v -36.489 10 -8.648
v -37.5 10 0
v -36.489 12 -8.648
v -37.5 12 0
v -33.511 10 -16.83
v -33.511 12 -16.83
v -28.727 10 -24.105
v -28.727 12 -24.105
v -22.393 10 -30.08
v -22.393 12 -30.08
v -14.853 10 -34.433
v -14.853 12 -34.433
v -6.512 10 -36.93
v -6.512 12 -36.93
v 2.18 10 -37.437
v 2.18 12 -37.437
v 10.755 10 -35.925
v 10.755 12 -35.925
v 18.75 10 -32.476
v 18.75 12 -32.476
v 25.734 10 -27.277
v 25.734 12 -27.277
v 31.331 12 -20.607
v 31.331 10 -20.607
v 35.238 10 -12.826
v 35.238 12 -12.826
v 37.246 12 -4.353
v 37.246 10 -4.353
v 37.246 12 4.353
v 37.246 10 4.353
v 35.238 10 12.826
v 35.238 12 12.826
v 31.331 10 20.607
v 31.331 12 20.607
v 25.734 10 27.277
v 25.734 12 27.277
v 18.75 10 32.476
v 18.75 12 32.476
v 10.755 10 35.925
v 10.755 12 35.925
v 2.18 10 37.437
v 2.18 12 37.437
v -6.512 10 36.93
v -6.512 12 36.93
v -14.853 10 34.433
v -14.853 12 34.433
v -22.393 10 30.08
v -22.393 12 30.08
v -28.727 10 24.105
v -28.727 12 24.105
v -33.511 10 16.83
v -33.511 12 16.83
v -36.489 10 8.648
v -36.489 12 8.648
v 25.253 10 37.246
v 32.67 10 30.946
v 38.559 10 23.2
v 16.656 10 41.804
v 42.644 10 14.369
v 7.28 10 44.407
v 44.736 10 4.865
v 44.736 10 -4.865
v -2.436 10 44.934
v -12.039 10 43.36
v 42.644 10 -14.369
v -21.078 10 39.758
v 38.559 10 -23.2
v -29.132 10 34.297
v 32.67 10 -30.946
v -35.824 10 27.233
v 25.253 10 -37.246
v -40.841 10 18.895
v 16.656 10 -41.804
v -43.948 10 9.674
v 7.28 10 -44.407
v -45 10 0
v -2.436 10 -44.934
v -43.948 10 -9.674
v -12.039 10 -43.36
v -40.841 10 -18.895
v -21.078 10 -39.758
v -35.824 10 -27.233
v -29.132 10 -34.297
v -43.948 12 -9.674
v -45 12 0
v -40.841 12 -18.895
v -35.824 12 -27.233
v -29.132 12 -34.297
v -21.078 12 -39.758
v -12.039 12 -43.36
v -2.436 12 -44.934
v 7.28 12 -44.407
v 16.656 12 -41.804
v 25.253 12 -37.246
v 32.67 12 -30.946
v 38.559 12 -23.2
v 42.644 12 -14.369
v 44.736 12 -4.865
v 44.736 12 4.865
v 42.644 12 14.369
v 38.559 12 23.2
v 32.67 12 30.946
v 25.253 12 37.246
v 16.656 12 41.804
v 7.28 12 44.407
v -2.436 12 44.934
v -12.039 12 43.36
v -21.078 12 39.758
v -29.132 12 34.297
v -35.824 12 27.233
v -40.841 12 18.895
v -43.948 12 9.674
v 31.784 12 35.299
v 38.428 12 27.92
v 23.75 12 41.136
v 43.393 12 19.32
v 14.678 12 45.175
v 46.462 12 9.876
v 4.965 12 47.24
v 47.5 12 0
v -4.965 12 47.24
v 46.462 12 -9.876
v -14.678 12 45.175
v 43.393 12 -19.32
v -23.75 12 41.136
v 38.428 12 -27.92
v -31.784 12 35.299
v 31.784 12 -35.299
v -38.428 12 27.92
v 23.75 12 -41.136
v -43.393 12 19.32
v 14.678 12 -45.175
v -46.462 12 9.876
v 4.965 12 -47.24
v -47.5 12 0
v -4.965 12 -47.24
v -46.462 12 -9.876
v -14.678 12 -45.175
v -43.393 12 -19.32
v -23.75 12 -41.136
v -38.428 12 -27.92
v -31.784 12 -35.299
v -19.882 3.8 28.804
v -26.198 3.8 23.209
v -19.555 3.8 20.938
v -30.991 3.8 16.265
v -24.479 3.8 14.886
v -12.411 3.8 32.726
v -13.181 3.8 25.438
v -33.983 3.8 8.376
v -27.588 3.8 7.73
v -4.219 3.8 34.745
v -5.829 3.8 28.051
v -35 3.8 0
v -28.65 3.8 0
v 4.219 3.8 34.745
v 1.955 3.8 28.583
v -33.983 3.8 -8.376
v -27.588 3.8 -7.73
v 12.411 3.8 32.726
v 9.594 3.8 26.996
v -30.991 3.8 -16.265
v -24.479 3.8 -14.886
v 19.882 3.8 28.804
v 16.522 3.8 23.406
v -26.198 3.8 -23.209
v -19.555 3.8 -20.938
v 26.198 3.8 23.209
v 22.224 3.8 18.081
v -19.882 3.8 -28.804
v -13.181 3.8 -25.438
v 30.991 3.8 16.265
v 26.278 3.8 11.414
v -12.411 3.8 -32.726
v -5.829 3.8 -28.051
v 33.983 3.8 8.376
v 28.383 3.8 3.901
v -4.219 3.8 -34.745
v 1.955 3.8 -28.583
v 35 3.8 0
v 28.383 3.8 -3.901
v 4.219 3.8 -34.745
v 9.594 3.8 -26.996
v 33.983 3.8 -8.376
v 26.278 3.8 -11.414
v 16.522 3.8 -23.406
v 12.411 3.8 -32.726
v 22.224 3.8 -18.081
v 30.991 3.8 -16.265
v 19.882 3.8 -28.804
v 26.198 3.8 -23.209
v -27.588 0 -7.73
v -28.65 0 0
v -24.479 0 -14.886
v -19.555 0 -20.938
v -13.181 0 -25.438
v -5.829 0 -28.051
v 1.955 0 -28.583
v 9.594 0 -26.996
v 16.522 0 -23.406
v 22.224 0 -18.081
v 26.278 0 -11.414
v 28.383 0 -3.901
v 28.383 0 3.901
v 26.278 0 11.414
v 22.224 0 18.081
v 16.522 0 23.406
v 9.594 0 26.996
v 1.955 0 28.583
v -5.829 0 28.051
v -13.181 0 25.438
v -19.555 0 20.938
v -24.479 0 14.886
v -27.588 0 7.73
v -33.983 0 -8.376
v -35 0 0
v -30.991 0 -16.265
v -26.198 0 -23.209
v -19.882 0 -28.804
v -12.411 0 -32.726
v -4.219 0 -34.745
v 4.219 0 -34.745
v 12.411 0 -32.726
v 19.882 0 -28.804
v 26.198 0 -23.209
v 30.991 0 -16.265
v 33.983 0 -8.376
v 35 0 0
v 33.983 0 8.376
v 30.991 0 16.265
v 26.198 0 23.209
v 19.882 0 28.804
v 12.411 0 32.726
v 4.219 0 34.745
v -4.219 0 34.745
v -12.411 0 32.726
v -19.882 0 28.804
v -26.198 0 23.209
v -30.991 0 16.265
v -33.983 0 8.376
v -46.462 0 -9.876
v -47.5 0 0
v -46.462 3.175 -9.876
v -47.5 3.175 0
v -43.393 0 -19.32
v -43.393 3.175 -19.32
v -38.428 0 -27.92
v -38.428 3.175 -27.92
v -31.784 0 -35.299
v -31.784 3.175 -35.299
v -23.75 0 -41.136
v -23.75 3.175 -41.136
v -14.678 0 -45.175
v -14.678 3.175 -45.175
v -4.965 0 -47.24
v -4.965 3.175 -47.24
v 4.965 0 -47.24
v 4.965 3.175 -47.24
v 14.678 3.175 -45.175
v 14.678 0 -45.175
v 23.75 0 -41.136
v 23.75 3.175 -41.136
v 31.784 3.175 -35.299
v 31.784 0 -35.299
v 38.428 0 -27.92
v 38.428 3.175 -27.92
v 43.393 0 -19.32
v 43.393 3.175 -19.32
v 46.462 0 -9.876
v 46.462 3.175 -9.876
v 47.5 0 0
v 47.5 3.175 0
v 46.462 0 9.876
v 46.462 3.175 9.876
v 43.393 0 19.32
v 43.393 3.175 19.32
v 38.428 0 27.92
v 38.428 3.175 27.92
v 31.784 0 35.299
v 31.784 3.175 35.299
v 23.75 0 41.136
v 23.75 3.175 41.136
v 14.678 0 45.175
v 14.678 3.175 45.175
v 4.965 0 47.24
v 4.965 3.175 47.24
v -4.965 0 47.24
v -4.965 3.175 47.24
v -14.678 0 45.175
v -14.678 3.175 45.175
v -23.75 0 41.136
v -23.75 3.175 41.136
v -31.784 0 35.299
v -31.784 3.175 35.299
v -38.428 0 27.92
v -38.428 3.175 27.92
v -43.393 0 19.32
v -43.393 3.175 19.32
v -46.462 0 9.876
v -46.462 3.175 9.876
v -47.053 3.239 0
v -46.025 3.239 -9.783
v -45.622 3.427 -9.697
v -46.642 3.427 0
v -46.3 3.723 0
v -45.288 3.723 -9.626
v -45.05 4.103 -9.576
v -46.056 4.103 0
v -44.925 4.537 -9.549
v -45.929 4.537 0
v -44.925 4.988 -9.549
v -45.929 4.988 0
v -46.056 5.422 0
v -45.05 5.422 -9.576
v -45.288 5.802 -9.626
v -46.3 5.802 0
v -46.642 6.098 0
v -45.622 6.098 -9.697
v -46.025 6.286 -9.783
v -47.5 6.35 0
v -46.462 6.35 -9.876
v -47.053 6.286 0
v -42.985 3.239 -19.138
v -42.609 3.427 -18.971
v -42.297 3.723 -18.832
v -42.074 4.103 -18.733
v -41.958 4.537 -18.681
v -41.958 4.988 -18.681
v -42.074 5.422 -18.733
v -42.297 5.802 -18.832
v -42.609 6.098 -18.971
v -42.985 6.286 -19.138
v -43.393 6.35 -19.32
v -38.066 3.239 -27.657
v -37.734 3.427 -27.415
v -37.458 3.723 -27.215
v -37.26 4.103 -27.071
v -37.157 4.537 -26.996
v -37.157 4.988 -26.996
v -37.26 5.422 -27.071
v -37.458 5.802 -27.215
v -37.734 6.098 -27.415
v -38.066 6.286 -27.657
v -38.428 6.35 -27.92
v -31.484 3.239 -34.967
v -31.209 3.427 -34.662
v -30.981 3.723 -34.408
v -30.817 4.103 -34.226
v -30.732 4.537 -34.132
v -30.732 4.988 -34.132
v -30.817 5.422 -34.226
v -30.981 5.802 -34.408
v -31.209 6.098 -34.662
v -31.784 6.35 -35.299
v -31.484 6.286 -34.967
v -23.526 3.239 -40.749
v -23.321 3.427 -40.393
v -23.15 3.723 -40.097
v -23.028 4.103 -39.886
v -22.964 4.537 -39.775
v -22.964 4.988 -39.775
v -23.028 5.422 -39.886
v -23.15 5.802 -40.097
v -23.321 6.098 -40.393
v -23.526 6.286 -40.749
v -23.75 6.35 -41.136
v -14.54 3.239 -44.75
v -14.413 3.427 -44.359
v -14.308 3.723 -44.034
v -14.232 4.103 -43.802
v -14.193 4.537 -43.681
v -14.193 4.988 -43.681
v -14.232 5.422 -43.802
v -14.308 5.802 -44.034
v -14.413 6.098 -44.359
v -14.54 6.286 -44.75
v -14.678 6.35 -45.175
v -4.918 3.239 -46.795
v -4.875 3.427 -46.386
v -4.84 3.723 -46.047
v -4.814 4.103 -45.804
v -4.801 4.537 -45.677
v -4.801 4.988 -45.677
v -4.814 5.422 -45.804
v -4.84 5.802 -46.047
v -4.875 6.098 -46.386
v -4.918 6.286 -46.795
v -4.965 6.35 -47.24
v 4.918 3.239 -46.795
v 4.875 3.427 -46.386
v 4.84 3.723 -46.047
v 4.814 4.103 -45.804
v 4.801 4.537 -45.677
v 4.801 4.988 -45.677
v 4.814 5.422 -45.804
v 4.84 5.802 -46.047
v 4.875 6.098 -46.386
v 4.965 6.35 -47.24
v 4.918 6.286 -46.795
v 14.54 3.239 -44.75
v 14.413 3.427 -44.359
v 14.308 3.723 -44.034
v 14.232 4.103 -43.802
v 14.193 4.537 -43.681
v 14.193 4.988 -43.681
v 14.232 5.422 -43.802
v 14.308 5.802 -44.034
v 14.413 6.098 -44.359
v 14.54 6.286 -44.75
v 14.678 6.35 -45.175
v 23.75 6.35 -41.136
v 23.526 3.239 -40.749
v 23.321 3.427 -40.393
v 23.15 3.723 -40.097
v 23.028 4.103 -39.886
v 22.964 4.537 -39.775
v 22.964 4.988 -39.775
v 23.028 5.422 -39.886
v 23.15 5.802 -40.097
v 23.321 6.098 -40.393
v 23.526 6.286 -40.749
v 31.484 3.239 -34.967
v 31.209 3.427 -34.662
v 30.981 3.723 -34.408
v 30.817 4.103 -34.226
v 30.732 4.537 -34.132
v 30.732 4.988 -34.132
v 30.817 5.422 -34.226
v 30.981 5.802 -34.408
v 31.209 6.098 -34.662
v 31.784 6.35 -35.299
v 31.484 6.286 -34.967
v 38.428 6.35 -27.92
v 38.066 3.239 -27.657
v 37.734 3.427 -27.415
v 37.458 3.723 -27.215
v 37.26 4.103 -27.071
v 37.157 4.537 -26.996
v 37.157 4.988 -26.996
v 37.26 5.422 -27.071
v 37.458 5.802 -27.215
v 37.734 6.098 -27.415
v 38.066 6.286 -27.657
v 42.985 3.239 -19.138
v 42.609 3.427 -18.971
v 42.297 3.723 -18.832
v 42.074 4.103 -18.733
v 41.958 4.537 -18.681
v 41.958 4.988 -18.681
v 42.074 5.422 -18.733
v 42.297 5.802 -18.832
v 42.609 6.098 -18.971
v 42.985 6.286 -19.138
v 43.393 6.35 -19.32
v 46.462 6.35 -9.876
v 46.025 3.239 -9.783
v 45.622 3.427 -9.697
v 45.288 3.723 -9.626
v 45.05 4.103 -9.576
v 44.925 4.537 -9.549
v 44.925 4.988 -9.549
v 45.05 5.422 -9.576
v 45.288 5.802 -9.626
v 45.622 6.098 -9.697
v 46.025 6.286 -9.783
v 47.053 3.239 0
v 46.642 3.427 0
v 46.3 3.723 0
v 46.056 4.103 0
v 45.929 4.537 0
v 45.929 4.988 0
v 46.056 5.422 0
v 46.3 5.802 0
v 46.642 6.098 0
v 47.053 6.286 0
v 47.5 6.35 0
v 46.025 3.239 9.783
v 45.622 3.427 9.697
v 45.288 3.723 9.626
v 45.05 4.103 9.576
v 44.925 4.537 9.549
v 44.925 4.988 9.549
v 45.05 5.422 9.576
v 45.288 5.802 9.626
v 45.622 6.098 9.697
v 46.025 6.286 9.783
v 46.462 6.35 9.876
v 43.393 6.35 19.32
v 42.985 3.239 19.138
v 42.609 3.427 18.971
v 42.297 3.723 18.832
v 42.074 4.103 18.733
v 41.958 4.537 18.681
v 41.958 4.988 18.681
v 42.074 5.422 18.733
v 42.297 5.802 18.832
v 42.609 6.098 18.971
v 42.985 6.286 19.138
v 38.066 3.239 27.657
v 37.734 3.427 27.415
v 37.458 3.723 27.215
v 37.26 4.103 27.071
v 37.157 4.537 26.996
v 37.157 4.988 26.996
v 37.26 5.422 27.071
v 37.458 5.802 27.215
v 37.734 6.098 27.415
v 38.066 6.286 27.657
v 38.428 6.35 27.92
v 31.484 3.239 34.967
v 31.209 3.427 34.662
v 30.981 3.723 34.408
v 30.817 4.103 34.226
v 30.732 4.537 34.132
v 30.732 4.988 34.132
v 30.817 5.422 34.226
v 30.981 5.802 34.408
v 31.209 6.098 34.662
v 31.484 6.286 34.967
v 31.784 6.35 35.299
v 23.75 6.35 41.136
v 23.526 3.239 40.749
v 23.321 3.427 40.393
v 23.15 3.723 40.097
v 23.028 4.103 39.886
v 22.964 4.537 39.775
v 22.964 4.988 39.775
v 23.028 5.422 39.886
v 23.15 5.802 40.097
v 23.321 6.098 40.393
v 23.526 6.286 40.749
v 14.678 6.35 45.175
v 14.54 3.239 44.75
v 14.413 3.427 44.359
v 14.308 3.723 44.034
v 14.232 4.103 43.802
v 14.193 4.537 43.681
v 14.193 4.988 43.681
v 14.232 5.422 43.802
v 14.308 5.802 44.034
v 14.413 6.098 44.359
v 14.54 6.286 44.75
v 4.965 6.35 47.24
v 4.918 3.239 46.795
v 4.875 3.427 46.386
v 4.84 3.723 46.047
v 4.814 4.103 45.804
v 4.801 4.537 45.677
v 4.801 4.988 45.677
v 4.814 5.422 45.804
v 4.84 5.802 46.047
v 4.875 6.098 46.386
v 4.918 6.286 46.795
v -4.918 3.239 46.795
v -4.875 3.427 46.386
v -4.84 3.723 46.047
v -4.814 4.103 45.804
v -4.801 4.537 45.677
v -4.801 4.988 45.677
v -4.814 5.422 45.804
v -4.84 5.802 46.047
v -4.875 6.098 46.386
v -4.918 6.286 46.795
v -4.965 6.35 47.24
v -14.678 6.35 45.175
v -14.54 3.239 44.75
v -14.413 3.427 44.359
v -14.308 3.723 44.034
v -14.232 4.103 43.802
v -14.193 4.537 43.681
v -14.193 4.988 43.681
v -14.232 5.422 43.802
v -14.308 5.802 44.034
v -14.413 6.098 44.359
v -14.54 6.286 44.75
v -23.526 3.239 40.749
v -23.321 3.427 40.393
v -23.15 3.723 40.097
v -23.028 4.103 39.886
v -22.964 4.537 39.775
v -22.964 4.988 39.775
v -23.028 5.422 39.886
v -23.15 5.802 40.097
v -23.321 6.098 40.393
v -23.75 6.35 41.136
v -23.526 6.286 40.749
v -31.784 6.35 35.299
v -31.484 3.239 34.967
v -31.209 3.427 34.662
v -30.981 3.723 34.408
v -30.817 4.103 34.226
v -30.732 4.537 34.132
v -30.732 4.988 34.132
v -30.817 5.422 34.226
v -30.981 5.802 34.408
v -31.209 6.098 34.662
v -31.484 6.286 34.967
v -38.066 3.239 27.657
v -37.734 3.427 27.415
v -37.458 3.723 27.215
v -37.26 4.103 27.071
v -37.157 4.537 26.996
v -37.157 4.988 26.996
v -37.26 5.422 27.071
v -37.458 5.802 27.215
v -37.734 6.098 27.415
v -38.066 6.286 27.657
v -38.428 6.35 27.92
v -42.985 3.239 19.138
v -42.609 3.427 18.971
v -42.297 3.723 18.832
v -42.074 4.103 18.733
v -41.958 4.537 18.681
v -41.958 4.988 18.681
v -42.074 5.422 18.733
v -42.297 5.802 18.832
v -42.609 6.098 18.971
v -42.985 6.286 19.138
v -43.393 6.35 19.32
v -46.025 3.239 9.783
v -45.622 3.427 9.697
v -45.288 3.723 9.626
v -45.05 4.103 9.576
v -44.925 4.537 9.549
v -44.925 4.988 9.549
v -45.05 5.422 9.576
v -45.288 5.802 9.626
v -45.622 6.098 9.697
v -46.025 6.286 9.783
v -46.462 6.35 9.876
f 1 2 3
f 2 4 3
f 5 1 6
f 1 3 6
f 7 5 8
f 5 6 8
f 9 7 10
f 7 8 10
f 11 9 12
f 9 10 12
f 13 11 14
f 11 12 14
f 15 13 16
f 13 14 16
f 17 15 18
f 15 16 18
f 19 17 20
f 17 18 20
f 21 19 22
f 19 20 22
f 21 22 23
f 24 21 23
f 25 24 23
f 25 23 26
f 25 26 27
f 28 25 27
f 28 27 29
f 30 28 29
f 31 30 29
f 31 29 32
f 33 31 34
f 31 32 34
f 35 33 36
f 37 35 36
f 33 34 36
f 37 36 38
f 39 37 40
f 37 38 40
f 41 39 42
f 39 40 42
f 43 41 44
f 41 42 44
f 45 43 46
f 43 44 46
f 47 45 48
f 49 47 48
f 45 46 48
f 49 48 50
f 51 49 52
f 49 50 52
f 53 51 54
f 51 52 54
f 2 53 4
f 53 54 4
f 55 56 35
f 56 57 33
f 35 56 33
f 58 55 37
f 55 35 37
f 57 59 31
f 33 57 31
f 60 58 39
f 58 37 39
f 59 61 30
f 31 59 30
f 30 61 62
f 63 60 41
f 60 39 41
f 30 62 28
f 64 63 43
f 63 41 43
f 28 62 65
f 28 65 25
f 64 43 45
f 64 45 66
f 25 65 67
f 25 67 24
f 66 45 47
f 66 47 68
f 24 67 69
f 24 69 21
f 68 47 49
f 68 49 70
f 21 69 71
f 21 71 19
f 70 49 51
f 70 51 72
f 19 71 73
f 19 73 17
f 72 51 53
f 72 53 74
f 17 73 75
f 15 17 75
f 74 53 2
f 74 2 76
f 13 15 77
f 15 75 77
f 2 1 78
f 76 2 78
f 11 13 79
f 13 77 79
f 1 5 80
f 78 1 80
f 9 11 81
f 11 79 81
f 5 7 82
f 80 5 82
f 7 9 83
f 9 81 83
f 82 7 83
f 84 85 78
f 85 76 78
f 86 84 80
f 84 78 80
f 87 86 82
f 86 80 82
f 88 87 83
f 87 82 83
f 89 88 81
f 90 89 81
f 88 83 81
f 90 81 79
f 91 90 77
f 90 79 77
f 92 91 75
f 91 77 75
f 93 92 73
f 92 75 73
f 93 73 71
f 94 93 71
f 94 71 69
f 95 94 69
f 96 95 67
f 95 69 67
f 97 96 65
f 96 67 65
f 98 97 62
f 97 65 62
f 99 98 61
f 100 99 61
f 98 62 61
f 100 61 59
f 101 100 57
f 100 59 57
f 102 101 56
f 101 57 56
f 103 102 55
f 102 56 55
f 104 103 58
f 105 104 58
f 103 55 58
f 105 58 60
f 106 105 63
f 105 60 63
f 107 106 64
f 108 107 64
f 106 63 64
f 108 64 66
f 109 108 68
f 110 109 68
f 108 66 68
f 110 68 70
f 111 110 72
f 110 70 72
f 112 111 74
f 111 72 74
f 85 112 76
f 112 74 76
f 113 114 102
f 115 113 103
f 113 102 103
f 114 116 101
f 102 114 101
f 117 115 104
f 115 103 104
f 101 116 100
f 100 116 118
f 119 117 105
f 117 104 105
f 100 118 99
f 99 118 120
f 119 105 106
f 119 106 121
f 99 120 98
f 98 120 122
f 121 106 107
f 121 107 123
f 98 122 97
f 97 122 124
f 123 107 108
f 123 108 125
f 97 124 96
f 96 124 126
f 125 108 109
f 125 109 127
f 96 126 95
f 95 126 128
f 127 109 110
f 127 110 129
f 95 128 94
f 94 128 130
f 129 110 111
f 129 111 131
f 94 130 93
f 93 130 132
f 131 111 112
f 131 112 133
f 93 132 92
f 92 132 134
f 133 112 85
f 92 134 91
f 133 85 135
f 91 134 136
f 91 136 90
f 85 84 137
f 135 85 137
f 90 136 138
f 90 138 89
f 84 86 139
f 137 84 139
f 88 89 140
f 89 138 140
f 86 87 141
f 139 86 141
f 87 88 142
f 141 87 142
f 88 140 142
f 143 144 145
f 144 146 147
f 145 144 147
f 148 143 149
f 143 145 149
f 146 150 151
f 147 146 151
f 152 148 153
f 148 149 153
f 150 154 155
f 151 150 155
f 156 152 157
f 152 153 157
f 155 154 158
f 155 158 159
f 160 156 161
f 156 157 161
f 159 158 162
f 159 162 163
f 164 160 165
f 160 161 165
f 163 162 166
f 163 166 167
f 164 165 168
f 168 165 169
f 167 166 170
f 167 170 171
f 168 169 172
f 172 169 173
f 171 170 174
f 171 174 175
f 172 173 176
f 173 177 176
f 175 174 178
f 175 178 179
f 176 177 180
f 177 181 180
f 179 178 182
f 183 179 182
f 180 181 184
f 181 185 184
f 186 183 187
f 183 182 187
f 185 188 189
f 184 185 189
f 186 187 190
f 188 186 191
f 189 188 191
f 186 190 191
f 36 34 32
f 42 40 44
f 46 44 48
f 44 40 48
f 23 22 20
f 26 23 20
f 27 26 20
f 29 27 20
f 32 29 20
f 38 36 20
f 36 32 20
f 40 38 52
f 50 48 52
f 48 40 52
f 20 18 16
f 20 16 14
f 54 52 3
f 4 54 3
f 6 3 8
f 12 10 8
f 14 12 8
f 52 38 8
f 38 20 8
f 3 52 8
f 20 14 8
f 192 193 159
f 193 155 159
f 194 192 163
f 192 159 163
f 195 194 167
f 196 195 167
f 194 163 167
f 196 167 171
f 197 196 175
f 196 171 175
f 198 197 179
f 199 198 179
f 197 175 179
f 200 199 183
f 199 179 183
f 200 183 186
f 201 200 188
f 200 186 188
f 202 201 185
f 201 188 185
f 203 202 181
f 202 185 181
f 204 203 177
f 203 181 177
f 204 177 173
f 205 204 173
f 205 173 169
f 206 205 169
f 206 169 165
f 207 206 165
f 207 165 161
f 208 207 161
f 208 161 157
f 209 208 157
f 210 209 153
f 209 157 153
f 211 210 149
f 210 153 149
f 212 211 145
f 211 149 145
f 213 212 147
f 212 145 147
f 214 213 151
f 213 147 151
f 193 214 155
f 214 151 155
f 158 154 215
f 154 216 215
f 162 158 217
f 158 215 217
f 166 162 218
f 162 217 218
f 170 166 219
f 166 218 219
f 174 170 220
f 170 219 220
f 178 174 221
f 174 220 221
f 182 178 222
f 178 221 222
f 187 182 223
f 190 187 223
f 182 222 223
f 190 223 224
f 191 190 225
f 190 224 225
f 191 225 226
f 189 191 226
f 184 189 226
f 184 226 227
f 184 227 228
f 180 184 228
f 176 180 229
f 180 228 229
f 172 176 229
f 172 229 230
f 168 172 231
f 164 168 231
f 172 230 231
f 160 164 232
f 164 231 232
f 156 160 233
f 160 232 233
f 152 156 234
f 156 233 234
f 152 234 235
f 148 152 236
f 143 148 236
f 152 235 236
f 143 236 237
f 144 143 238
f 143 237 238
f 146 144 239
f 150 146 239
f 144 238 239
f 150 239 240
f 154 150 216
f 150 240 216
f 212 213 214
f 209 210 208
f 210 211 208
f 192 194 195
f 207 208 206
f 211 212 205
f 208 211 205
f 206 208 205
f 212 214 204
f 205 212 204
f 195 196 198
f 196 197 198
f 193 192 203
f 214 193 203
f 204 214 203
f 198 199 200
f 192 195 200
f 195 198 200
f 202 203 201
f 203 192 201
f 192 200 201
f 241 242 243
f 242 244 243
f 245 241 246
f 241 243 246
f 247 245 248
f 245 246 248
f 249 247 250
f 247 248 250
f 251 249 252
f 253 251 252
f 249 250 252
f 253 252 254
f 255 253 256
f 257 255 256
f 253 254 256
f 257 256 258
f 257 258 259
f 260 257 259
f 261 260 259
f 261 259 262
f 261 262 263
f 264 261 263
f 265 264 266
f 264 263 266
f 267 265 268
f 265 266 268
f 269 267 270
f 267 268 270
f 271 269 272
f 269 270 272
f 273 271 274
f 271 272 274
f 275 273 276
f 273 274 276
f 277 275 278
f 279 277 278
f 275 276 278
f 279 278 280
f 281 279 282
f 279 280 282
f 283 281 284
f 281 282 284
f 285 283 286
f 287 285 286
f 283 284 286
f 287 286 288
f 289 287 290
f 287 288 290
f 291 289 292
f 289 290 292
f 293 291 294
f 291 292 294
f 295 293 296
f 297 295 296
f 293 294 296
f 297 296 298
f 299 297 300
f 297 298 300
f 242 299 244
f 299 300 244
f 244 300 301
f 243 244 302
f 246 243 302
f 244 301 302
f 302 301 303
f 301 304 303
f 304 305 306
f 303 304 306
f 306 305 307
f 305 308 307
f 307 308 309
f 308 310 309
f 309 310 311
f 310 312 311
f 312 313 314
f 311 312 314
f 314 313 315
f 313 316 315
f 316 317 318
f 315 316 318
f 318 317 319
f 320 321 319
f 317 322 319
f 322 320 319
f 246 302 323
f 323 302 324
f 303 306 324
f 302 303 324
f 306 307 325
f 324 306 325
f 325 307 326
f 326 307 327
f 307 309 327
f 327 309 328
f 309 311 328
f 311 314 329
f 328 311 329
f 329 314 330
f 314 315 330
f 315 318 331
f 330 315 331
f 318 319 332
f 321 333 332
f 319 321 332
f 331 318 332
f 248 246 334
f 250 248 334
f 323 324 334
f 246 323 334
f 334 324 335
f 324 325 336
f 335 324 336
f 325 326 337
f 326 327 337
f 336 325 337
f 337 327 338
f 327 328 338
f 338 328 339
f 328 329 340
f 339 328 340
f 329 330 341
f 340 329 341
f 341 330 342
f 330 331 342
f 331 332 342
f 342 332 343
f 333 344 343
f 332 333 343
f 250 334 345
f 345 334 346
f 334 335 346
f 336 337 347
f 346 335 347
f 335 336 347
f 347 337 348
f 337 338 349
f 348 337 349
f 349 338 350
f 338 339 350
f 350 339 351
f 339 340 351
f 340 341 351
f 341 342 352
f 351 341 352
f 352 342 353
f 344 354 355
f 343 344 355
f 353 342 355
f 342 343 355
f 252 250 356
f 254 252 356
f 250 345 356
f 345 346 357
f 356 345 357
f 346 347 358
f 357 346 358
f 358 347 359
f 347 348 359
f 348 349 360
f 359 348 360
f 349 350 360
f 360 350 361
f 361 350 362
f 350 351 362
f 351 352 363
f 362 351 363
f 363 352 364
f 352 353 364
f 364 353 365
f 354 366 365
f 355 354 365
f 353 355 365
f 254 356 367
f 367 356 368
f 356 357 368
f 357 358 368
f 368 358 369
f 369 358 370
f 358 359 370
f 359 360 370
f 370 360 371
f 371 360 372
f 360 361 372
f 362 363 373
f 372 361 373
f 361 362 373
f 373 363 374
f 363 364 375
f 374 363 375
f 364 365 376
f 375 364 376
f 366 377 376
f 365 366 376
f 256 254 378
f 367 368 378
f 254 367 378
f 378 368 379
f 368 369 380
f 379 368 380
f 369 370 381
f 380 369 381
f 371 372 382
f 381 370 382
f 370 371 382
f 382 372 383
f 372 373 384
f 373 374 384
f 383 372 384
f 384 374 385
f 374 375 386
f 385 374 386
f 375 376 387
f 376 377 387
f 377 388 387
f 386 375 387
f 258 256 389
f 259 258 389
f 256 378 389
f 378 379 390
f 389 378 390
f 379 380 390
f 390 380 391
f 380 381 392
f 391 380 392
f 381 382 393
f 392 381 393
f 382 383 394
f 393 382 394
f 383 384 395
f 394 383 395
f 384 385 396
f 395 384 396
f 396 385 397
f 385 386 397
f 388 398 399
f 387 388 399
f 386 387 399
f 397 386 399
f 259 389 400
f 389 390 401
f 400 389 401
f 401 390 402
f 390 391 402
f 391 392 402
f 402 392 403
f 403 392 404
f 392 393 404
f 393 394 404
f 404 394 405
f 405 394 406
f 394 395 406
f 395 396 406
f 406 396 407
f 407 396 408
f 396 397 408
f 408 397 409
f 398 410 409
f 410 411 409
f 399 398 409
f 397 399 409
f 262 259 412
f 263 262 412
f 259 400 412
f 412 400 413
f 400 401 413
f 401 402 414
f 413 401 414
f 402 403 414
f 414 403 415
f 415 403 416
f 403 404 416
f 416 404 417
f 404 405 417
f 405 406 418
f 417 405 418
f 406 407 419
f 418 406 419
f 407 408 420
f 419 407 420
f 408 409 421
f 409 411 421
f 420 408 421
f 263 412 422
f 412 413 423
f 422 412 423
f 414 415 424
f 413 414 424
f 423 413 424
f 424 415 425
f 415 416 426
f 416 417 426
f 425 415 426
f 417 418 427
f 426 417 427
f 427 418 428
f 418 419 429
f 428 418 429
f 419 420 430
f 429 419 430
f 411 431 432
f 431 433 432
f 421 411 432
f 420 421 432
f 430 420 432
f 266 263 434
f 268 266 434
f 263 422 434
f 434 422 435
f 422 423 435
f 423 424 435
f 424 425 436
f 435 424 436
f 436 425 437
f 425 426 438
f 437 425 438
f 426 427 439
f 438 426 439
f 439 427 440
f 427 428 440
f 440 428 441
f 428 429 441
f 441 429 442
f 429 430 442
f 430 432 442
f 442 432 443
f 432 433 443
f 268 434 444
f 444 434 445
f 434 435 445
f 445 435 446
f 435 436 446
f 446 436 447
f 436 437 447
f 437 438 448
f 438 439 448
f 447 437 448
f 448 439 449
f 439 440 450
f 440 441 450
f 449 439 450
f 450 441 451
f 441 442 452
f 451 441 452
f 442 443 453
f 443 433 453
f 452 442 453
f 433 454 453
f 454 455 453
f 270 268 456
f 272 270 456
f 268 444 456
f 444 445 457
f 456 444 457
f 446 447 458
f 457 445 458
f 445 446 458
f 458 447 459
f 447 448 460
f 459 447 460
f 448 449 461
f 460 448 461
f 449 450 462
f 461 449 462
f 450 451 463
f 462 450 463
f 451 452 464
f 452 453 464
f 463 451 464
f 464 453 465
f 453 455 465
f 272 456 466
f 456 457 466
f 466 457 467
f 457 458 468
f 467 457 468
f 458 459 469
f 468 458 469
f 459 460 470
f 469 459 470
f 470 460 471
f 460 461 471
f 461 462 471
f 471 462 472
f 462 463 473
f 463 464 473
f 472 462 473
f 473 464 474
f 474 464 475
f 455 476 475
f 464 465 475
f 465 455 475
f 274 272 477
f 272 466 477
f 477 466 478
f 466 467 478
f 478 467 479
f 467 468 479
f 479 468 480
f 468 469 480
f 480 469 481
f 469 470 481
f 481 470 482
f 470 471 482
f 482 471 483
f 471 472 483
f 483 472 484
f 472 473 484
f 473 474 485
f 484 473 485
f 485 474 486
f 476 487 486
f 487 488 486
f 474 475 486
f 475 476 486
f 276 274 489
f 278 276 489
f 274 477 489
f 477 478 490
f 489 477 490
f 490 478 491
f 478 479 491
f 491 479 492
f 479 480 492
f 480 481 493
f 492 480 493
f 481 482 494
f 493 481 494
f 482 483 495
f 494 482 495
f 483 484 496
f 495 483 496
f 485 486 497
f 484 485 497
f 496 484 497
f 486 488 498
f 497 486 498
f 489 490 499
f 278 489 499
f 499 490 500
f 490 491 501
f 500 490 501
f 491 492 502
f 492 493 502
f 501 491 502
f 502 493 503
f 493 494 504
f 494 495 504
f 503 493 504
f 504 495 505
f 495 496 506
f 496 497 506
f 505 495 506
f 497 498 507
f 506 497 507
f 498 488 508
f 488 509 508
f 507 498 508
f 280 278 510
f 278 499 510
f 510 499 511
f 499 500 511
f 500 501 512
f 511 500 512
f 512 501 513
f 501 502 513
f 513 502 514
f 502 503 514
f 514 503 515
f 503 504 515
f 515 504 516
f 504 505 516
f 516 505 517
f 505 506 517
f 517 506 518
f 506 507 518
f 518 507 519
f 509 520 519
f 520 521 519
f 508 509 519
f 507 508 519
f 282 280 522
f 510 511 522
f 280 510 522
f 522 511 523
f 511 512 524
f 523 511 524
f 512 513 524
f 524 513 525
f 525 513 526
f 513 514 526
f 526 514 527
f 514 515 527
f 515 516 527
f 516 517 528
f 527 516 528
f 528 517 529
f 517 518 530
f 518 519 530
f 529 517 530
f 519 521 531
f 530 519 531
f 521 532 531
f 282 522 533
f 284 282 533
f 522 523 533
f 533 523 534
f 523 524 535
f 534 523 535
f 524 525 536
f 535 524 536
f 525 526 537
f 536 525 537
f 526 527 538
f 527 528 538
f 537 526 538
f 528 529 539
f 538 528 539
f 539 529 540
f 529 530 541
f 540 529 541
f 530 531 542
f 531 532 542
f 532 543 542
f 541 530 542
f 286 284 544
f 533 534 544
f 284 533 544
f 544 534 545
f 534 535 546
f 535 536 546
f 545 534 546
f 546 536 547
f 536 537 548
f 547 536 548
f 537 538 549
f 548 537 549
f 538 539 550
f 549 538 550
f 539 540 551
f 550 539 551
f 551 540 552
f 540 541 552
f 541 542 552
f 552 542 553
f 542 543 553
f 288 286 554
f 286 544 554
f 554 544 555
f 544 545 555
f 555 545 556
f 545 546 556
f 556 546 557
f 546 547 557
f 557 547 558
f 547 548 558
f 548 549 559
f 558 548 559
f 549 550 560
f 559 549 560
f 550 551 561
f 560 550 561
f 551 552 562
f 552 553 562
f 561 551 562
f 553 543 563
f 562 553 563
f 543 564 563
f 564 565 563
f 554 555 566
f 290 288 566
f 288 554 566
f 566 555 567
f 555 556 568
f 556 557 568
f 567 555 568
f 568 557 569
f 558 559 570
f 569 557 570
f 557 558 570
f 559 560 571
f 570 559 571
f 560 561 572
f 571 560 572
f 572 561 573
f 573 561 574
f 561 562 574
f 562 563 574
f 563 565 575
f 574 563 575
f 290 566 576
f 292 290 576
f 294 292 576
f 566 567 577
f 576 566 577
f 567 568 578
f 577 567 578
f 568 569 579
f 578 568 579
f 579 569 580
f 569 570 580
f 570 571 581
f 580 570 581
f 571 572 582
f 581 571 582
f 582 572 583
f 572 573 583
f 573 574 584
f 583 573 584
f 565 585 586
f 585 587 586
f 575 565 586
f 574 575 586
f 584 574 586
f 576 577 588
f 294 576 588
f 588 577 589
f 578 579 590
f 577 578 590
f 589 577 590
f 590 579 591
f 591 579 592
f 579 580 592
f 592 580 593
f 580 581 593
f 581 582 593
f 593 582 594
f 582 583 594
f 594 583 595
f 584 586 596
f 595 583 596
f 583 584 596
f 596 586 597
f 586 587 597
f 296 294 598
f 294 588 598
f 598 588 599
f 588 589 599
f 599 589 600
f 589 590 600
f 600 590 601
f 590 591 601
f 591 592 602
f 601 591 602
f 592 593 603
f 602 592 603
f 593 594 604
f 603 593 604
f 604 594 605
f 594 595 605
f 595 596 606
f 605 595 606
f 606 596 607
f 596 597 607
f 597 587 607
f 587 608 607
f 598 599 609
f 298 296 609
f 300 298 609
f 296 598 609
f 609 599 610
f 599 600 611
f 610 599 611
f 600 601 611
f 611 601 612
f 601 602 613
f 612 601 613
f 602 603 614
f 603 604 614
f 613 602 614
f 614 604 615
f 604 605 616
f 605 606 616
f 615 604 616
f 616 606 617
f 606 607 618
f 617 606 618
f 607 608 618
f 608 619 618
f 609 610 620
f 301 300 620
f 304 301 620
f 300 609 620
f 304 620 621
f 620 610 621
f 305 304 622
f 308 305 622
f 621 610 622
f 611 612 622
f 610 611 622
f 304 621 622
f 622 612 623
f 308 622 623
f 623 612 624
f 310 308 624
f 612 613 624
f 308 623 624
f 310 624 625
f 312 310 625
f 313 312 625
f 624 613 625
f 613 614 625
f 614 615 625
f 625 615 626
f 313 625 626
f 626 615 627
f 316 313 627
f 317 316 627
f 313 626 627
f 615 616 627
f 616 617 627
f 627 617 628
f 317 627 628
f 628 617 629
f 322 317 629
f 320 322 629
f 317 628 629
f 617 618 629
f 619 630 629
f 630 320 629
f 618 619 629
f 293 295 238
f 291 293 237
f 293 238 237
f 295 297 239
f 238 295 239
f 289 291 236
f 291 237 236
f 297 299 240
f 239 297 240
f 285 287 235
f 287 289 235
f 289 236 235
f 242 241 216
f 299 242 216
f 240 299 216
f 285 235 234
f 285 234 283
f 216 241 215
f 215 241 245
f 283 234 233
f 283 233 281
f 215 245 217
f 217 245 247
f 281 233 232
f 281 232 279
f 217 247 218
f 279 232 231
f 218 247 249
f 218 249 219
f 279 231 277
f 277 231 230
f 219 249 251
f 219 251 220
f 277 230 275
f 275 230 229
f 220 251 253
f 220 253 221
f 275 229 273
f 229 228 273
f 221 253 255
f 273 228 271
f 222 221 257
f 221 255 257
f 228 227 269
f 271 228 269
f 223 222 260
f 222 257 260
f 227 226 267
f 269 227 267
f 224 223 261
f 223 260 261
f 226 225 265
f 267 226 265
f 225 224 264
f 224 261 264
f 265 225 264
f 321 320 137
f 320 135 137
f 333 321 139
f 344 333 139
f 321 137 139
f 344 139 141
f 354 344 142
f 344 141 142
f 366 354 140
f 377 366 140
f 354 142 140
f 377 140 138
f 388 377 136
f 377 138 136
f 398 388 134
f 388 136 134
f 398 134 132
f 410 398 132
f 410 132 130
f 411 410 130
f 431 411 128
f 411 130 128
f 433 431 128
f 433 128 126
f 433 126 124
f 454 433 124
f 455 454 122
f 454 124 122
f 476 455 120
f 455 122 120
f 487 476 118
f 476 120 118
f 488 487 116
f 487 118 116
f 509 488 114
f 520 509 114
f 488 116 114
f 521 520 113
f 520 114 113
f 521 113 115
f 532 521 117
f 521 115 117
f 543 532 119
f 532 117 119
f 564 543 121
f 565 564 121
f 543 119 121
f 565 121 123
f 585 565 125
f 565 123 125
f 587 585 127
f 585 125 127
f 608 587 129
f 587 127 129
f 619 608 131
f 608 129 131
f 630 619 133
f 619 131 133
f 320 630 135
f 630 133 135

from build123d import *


with BuildPart() as part:
    # Sketch1 → Revolve1 (revolve)
    with BuildSketch(Plane.XY):
        with BuildLine():
            Line((-35, 0), (-47.5, 0))
            Line((-47.5, 0), (-47.5, 3.175))
            ThreePointArc((-47.5, 3.175), (-45.9125, 4.7625), (-47.5, 6.35))
            Line((-47.5, 6.35), (-47.5, 12))
            Line((-47.5, 12), (-45, 12))
            Line((-45, 12), (-45, 10))
            Line((-45, 10), (-37.5, 10))
            Line((-37.5, 10), (-37.5, 12))
            Line((-37.5, 12), (0, 12))
            Line((0, 12), (0, 0))
            Line((0, 0), (-28.65, 0))
            Line((-28.65, 0), (-28.65, 3.8))
            Line((-28.65, 3.8), (-35, 3.8))
            Line((-35, 3.8), (-35, 0))
        make_face()
    revolve(axis=Axis((0, 0, 0), (0, -1, 0)))


solid = part.part
